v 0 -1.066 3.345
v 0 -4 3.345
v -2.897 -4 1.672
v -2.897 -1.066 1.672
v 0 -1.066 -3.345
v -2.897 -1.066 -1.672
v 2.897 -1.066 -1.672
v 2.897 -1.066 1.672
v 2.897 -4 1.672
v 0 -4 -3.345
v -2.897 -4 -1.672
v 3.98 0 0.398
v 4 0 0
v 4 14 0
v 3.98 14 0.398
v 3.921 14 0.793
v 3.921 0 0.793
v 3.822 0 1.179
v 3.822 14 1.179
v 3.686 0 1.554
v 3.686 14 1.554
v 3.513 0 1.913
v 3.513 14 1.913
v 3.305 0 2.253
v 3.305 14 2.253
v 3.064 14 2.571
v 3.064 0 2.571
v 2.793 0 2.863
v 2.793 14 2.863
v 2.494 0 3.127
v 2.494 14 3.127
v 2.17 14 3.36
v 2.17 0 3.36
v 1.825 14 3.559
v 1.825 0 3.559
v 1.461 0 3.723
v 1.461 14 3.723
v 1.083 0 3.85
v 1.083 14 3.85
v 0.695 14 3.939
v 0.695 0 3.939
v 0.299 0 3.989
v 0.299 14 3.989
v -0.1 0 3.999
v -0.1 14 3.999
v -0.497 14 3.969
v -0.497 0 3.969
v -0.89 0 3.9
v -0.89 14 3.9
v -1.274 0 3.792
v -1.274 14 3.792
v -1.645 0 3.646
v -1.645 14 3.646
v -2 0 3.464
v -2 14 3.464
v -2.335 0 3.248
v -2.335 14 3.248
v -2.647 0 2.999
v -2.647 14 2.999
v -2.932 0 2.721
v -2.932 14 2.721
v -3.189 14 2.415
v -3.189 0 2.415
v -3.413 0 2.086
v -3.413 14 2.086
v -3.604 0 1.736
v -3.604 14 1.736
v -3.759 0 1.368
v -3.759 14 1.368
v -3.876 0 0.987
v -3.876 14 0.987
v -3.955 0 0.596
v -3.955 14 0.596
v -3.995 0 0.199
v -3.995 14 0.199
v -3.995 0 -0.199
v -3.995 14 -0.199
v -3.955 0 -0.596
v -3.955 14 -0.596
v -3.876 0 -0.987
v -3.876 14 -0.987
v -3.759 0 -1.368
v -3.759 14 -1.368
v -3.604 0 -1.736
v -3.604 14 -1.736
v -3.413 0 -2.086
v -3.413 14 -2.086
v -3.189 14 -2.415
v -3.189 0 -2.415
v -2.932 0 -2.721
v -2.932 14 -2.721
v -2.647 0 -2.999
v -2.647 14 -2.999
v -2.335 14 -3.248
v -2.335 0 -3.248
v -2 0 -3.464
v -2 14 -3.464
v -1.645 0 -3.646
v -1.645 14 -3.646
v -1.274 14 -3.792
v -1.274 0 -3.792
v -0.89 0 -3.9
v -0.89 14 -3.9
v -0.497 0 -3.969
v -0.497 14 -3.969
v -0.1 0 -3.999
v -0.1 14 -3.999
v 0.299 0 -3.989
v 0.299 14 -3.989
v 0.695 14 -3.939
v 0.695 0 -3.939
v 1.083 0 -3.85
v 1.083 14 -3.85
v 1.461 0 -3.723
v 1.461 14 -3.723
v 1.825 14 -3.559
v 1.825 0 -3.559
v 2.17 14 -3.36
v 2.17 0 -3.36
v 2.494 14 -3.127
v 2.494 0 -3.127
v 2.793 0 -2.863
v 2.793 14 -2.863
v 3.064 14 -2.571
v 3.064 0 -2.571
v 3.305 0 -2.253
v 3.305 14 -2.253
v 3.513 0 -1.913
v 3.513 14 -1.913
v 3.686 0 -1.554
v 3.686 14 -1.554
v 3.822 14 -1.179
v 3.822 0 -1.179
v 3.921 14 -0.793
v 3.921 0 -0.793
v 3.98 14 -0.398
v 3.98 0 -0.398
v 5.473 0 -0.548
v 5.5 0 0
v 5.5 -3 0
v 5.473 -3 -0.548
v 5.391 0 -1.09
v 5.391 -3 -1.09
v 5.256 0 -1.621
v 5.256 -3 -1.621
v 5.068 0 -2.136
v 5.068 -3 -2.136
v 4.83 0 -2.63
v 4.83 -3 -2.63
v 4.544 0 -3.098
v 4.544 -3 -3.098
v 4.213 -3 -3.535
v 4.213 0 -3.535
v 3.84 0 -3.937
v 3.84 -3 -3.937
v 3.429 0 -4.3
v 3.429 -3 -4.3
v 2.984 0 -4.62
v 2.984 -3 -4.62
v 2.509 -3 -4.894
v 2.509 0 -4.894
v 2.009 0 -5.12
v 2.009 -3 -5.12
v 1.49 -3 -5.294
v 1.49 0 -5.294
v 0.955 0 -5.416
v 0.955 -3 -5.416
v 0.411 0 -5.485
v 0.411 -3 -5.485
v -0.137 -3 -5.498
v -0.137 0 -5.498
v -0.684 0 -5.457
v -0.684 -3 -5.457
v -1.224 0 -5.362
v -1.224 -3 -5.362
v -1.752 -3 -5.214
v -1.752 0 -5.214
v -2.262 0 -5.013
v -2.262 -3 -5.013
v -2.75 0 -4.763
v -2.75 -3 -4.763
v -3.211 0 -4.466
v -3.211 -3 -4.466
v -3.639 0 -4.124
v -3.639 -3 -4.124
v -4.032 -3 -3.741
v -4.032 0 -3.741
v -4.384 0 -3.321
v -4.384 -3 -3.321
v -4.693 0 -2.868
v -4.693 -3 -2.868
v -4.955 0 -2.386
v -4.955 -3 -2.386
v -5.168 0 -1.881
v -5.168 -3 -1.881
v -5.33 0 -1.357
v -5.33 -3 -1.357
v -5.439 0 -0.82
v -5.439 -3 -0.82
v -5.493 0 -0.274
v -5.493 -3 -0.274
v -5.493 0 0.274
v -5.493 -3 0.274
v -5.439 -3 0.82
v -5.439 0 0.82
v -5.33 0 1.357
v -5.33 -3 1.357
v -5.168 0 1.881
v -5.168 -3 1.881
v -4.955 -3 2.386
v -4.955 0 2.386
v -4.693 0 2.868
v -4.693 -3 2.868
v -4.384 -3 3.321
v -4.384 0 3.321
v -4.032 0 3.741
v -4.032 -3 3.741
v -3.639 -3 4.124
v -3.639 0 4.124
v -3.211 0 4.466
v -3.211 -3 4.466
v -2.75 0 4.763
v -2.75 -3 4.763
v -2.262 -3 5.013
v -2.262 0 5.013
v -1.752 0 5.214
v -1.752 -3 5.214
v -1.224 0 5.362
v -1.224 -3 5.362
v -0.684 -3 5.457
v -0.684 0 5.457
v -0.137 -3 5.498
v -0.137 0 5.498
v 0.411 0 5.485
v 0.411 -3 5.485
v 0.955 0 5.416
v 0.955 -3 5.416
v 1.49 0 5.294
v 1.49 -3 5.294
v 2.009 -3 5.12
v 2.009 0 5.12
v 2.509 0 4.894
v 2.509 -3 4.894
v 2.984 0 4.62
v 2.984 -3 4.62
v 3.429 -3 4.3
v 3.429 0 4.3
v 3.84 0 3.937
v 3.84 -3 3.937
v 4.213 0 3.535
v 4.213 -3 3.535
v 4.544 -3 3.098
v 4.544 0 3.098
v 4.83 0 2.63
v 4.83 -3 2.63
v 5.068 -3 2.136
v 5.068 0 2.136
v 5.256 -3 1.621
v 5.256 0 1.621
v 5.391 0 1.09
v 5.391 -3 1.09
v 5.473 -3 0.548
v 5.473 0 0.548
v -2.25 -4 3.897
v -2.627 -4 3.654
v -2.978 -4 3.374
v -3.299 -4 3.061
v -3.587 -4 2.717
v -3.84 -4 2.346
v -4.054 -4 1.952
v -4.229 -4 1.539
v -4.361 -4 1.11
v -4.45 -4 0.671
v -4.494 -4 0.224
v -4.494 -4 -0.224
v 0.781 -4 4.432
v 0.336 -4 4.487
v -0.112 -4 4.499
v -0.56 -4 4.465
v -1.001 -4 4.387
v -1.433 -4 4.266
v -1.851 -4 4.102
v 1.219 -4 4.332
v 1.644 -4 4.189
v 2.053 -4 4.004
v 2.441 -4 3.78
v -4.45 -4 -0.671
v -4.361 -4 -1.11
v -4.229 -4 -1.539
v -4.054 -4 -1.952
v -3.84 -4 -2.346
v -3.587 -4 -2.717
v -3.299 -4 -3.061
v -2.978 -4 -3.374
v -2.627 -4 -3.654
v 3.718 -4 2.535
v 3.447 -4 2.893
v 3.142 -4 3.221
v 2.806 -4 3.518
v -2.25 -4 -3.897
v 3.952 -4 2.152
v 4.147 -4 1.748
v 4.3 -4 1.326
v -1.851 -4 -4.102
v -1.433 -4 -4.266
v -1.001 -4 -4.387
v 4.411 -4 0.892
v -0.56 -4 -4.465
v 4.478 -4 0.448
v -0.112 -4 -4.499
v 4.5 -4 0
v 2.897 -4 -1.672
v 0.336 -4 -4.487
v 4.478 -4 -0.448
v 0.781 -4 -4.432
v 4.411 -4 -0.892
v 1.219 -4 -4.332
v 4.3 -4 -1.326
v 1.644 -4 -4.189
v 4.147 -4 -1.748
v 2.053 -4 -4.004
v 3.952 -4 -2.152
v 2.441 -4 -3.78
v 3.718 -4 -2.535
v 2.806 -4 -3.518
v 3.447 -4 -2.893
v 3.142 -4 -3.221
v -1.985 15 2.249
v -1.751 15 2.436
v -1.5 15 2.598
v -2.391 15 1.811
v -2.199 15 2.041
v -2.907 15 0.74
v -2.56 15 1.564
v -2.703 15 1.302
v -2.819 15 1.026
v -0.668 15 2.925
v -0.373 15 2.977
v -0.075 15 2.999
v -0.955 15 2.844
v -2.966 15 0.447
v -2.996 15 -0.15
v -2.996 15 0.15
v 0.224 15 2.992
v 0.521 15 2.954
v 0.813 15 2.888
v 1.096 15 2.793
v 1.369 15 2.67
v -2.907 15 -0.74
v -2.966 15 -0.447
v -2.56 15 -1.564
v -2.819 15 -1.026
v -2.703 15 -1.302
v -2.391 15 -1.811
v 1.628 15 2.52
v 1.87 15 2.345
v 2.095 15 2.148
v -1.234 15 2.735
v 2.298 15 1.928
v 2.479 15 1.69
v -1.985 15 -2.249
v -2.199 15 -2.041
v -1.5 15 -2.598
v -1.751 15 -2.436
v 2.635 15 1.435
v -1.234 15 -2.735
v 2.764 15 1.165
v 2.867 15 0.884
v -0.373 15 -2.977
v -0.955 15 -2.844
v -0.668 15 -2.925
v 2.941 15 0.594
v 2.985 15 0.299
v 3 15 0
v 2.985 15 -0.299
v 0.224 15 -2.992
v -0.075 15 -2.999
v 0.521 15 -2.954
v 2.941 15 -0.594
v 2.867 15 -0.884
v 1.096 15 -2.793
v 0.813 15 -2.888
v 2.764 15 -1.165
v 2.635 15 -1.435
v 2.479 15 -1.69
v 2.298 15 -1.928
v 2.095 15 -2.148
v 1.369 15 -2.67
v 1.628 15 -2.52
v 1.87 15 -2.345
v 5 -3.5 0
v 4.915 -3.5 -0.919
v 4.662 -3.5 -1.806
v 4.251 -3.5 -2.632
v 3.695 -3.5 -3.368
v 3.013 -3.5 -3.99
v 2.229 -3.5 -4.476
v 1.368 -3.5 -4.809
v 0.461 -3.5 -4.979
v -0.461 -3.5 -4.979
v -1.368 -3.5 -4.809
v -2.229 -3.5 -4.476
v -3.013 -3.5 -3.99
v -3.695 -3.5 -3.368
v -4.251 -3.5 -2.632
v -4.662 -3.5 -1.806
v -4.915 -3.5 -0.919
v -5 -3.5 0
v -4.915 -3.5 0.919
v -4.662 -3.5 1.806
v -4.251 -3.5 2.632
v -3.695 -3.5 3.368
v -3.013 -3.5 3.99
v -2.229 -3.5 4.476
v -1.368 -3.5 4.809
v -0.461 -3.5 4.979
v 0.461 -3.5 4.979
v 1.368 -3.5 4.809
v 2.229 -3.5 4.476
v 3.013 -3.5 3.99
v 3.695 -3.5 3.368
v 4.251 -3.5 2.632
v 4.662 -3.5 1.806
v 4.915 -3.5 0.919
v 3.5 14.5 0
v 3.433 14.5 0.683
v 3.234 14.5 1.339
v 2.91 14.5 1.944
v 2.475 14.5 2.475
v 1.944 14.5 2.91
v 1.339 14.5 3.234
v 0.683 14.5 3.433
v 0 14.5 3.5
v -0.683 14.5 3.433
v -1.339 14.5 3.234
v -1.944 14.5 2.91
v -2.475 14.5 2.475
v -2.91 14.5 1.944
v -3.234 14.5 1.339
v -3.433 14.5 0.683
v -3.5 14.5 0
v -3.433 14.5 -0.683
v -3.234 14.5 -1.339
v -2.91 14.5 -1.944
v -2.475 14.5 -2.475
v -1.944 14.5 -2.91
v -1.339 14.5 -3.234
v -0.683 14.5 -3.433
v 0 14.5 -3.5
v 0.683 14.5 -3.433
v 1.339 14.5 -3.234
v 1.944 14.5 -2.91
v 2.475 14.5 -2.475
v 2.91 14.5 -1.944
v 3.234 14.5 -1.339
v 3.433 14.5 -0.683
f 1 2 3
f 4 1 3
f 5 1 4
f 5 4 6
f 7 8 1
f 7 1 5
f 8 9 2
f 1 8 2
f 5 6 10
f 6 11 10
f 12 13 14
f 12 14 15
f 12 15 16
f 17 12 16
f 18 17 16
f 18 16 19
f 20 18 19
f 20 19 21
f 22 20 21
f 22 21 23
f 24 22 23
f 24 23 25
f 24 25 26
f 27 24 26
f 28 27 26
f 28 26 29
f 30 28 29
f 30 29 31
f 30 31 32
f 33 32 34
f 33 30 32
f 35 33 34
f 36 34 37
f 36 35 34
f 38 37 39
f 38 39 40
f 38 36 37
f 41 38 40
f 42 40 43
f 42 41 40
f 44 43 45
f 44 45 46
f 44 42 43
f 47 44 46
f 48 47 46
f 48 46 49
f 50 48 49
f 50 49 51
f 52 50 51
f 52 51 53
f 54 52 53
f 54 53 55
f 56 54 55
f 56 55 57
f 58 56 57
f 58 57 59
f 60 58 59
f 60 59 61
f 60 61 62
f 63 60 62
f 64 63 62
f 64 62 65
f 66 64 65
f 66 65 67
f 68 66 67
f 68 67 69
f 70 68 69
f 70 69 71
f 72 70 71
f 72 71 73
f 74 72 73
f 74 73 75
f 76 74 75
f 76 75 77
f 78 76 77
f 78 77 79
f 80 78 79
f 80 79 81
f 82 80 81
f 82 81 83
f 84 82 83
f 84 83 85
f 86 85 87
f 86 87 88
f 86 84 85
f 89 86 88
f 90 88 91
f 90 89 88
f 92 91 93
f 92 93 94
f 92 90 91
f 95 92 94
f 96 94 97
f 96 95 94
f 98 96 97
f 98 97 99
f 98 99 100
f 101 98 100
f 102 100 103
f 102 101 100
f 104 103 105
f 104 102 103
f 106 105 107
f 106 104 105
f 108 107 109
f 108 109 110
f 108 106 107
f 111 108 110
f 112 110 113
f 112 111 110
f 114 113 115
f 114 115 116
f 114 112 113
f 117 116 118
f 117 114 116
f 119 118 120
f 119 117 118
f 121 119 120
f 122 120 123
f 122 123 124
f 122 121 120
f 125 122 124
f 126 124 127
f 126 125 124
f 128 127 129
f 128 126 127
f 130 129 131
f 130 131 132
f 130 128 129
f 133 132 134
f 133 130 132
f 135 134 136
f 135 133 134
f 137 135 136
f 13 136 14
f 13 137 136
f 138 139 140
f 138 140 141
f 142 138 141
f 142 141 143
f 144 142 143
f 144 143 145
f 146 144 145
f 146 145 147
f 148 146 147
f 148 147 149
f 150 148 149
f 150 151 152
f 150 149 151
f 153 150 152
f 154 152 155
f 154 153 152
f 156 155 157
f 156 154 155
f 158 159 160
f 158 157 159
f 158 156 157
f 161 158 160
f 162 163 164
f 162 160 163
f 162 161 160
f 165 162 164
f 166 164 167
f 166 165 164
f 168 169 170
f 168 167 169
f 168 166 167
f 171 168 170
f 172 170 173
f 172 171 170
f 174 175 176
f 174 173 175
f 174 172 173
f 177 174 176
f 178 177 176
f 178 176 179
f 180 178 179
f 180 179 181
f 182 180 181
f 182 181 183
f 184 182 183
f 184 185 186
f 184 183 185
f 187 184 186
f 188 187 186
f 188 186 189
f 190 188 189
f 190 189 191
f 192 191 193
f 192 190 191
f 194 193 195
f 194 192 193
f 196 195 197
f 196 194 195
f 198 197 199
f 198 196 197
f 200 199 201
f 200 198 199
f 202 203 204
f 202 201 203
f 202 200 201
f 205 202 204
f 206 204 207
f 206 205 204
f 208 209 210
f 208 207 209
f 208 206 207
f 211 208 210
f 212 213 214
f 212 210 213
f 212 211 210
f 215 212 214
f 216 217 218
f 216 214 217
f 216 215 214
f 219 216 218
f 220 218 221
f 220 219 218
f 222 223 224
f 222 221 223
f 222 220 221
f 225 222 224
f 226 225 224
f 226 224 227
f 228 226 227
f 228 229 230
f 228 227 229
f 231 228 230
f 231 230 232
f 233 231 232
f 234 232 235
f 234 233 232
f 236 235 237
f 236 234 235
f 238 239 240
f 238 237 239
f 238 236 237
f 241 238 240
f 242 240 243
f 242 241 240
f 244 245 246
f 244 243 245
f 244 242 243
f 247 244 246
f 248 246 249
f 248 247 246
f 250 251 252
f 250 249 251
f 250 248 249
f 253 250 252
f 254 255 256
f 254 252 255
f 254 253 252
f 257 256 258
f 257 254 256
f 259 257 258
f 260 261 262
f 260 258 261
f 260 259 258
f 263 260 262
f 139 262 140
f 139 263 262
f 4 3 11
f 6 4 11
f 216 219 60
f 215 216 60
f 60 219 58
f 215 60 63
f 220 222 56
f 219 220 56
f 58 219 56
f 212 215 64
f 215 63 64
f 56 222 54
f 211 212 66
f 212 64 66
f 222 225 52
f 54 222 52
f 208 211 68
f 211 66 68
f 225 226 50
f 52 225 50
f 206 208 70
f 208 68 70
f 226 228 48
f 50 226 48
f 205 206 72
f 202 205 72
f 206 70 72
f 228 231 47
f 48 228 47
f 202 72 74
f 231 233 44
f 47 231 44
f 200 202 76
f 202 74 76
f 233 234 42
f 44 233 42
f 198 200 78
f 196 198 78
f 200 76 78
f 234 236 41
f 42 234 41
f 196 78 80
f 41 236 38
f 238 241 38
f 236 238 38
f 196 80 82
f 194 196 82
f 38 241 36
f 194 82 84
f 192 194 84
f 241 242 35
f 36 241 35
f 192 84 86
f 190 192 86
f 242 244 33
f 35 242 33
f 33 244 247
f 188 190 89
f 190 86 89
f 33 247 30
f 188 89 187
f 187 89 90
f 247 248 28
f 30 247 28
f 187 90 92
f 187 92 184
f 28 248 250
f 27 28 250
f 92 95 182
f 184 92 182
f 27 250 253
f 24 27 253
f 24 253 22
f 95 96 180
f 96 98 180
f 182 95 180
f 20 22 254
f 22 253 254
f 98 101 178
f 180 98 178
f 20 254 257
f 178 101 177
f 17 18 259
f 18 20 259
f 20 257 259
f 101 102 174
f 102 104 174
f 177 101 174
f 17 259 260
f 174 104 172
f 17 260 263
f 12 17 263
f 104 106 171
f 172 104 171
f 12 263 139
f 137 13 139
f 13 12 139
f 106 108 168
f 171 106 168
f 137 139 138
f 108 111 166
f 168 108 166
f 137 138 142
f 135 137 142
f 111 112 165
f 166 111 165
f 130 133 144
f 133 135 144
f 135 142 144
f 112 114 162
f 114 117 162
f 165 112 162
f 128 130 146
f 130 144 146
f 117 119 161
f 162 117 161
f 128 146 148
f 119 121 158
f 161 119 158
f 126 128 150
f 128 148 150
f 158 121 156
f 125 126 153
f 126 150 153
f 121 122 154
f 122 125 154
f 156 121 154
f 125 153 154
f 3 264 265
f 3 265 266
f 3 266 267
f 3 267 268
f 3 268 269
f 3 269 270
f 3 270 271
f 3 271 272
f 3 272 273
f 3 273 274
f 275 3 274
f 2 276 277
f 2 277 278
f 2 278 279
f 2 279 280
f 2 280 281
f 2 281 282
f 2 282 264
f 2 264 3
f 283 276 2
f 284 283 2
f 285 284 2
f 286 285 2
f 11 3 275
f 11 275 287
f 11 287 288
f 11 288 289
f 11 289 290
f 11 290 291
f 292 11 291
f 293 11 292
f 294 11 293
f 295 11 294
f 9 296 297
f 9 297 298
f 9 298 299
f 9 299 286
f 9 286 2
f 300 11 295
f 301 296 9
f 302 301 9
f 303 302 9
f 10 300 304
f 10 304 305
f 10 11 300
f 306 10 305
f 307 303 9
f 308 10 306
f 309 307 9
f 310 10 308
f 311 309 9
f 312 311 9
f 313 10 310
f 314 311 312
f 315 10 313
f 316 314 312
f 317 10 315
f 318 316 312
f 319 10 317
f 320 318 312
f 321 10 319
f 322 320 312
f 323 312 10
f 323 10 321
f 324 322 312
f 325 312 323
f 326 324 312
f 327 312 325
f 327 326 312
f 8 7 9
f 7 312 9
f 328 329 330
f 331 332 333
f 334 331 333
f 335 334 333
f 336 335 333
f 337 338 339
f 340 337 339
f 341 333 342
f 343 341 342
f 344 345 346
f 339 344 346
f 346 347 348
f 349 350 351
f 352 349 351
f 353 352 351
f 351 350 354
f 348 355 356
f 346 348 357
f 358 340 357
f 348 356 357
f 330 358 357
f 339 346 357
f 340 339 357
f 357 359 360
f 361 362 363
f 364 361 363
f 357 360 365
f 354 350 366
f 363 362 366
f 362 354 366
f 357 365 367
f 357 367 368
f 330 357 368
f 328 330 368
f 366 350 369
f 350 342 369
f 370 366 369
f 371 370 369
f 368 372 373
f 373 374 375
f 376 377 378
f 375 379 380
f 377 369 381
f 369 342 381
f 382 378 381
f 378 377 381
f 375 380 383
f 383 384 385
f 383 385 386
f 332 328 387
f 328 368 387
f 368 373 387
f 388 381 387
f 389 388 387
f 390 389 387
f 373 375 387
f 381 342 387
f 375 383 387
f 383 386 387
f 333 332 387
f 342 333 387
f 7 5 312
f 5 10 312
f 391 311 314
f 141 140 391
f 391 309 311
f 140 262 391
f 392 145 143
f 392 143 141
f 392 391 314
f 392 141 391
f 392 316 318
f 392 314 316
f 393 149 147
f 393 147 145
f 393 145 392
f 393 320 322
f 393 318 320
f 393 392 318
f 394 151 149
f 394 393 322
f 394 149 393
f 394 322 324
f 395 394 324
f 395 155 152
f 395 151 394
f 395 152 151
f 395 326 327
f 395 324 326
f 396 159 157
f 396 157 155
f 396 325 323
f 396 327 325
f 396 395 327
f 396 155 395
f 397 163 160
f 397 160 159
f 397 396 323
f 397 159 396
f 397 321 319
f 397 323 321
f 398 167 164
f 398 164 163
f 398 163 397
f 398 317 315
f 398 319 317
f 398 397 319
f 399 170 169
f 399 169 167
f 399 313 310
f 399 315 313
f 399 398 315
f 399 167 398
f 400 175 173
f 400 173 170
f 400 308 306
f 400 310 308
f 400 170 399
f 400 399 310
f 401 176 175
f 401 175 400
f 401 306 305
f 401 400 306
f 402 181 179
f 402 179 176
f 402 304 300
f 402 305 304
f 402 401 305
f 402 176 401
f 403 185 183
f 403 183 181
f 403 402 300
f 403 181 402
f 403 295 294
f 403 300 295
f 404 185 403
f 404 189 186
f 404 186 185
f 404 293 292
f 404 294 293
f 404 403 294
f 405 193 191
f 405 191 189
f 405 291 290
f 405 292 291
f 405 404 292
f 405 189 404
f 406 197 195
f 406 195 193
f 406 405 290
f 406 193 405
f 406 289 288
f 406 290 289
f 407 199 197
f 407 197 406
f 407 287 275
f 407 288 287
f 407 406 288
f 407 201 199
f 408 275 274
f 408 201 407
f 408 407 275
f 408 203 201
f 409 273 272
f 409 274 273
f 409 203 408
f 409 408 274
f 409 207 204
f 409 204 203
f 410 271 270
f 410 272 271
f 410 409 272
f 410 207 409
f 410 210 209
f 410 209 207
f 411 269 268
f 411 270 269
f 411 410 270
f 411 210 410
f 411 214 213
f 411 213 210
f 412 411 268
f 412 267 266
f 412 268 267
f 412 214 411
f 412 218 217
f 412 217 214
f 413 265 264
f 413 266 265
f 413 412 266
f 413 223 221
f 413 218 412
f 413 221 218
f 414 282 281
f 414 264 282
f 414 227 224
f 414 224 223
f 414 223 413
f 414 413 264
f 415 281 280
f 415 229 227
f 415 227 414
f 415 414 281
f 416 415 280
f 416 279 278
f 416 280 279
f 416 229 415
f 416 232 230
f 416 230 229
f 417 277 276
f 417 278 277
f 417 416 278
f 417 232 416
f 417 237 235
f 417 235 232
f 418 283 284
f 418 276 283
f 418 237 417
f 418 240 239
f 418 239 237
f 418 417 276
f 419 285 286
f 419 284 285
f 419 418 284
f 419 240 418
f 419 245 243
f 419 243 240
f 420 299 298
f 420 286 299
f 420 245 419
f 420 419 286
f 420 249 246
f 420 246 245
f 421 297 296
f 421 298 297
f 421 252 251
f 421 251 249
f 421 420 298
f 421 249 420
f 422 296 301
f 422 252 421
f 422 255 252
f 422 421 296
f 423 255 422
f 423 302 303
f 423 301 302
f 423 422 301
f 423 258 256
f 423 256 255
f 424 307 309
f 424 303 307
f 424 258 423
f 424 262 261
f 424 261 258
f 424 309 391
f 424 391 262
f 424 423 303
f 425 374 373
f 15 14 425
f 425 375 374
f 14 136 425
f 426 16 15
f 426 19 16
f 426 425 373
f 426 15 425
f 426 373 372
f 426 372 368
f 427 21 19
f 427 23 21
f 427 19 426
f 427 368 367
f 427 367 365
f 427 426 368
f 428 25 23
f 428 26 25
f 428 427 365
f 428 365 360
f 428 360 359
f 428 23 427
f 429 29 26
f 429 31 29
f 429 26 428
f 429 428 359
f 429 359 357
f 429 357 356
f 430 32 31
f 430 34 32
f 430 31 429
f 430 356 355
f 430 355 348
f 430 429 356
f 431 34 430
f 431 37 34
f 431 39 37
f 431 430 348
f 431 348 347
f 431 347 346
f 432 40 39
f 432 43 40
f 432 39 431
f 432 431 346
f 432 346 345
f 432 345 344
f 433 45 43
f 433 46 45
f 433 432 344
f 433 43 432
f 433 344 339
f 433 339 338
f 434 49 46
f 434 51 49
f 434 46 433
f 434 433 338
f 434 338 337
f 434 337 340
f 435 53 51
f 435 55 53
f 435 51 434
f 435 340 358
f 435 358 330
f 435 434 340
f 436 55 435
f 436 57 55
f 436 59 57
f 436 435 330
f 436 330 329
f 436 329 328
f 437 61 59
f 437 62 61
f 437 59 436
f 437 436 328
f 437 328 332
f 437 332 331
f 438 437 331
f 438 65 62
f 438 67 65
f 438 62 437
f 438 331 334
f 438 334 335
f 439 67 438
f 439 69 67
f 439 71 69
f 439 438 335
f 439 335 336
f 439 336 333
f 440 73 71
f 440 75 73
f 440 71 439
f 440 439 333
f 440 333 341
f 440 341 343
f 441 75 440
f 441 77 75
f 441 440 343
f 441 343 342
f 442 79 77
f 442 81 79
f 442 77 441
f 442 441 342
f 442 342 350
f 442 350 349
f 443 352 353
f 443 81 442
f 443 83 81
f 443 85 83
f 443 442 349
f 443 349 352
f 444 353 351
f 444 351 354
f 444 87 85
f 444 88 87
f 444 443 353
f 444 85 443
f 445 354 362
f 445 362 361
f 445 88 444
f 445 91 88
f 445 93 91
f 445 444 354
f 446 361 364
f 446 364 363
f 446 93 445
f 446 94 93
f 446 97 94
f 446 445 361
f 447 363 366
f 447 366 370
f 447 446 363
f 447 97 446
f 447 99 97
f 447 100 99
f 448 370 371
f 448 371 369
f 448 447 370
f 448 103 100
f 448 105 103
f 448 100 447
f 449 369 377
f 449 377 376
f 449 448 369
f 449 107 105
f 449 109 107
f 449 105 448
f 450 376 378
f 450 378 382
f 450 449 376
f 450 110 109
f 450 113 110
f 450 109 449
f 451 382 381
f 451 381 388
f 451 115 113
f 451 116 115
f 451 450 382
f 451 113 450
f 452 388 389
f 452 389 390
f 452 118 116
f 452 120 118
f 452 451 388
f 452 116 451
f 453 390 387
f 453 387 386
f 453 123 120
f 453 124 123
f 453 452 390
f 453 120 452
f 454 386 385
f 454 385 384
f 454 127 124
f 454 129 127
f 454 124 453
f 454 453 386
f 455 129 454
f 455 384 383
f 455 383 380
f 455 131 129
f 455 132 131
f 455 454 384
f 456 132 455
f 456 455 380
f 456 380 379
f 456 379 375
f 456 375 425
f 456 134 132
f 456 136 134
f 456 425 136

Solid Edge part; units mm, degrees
sketch "Sketch1" plane through (0, 0, 0) normal (0, -1, 0) x (1, 0, 0)
  circle A0 centre (0, 0) radius 4
extrude "Protrusion1" add sketch "Sketch1" against normal blind 15
sketch "Sketch2" plane through (0, 0, 0) normal (0, -1, 0) x (1, 0, 0)
  circle A0 centre (0, 0) radius 5.5
extrude "ProtrusiónExtruida_2" add sketch "Sketch2" along normal blind 4
chamfer "Chaflán_1" distance 1 angle 45 1 edges at (-5.5, -4, 0)
sketch "Sketch3" plane through (0, -4, 0) normal (0, -1, 0) x (0, 0, 1)
  line L0 (1.6725, -2.8968) -> (3.3449, 0)
  line L1 (3.3449, 0) -> (1.6725, 2.8968)
  line L2 (1.6725, 2.8968) -> (-1.6725, 2.8968)
  line L3 (-1.6725, 2.8968) -> (-3.3449, 0)
  line L4 (-3.3449, 0) -> (-1.6725, -2.8968)
  line L5 (-1.6725, -2.8968) -> (1.6725, -2.8968)
extrude "VaciadoExtruido_1" cut sketch "Sketch3" against normal blind 2.9342
chamfer "Chaflán_4" distance 1 angle 45 1 edges at (-4, 15, 0)
properties material "Steel - Structural:1.0035 , S185"
